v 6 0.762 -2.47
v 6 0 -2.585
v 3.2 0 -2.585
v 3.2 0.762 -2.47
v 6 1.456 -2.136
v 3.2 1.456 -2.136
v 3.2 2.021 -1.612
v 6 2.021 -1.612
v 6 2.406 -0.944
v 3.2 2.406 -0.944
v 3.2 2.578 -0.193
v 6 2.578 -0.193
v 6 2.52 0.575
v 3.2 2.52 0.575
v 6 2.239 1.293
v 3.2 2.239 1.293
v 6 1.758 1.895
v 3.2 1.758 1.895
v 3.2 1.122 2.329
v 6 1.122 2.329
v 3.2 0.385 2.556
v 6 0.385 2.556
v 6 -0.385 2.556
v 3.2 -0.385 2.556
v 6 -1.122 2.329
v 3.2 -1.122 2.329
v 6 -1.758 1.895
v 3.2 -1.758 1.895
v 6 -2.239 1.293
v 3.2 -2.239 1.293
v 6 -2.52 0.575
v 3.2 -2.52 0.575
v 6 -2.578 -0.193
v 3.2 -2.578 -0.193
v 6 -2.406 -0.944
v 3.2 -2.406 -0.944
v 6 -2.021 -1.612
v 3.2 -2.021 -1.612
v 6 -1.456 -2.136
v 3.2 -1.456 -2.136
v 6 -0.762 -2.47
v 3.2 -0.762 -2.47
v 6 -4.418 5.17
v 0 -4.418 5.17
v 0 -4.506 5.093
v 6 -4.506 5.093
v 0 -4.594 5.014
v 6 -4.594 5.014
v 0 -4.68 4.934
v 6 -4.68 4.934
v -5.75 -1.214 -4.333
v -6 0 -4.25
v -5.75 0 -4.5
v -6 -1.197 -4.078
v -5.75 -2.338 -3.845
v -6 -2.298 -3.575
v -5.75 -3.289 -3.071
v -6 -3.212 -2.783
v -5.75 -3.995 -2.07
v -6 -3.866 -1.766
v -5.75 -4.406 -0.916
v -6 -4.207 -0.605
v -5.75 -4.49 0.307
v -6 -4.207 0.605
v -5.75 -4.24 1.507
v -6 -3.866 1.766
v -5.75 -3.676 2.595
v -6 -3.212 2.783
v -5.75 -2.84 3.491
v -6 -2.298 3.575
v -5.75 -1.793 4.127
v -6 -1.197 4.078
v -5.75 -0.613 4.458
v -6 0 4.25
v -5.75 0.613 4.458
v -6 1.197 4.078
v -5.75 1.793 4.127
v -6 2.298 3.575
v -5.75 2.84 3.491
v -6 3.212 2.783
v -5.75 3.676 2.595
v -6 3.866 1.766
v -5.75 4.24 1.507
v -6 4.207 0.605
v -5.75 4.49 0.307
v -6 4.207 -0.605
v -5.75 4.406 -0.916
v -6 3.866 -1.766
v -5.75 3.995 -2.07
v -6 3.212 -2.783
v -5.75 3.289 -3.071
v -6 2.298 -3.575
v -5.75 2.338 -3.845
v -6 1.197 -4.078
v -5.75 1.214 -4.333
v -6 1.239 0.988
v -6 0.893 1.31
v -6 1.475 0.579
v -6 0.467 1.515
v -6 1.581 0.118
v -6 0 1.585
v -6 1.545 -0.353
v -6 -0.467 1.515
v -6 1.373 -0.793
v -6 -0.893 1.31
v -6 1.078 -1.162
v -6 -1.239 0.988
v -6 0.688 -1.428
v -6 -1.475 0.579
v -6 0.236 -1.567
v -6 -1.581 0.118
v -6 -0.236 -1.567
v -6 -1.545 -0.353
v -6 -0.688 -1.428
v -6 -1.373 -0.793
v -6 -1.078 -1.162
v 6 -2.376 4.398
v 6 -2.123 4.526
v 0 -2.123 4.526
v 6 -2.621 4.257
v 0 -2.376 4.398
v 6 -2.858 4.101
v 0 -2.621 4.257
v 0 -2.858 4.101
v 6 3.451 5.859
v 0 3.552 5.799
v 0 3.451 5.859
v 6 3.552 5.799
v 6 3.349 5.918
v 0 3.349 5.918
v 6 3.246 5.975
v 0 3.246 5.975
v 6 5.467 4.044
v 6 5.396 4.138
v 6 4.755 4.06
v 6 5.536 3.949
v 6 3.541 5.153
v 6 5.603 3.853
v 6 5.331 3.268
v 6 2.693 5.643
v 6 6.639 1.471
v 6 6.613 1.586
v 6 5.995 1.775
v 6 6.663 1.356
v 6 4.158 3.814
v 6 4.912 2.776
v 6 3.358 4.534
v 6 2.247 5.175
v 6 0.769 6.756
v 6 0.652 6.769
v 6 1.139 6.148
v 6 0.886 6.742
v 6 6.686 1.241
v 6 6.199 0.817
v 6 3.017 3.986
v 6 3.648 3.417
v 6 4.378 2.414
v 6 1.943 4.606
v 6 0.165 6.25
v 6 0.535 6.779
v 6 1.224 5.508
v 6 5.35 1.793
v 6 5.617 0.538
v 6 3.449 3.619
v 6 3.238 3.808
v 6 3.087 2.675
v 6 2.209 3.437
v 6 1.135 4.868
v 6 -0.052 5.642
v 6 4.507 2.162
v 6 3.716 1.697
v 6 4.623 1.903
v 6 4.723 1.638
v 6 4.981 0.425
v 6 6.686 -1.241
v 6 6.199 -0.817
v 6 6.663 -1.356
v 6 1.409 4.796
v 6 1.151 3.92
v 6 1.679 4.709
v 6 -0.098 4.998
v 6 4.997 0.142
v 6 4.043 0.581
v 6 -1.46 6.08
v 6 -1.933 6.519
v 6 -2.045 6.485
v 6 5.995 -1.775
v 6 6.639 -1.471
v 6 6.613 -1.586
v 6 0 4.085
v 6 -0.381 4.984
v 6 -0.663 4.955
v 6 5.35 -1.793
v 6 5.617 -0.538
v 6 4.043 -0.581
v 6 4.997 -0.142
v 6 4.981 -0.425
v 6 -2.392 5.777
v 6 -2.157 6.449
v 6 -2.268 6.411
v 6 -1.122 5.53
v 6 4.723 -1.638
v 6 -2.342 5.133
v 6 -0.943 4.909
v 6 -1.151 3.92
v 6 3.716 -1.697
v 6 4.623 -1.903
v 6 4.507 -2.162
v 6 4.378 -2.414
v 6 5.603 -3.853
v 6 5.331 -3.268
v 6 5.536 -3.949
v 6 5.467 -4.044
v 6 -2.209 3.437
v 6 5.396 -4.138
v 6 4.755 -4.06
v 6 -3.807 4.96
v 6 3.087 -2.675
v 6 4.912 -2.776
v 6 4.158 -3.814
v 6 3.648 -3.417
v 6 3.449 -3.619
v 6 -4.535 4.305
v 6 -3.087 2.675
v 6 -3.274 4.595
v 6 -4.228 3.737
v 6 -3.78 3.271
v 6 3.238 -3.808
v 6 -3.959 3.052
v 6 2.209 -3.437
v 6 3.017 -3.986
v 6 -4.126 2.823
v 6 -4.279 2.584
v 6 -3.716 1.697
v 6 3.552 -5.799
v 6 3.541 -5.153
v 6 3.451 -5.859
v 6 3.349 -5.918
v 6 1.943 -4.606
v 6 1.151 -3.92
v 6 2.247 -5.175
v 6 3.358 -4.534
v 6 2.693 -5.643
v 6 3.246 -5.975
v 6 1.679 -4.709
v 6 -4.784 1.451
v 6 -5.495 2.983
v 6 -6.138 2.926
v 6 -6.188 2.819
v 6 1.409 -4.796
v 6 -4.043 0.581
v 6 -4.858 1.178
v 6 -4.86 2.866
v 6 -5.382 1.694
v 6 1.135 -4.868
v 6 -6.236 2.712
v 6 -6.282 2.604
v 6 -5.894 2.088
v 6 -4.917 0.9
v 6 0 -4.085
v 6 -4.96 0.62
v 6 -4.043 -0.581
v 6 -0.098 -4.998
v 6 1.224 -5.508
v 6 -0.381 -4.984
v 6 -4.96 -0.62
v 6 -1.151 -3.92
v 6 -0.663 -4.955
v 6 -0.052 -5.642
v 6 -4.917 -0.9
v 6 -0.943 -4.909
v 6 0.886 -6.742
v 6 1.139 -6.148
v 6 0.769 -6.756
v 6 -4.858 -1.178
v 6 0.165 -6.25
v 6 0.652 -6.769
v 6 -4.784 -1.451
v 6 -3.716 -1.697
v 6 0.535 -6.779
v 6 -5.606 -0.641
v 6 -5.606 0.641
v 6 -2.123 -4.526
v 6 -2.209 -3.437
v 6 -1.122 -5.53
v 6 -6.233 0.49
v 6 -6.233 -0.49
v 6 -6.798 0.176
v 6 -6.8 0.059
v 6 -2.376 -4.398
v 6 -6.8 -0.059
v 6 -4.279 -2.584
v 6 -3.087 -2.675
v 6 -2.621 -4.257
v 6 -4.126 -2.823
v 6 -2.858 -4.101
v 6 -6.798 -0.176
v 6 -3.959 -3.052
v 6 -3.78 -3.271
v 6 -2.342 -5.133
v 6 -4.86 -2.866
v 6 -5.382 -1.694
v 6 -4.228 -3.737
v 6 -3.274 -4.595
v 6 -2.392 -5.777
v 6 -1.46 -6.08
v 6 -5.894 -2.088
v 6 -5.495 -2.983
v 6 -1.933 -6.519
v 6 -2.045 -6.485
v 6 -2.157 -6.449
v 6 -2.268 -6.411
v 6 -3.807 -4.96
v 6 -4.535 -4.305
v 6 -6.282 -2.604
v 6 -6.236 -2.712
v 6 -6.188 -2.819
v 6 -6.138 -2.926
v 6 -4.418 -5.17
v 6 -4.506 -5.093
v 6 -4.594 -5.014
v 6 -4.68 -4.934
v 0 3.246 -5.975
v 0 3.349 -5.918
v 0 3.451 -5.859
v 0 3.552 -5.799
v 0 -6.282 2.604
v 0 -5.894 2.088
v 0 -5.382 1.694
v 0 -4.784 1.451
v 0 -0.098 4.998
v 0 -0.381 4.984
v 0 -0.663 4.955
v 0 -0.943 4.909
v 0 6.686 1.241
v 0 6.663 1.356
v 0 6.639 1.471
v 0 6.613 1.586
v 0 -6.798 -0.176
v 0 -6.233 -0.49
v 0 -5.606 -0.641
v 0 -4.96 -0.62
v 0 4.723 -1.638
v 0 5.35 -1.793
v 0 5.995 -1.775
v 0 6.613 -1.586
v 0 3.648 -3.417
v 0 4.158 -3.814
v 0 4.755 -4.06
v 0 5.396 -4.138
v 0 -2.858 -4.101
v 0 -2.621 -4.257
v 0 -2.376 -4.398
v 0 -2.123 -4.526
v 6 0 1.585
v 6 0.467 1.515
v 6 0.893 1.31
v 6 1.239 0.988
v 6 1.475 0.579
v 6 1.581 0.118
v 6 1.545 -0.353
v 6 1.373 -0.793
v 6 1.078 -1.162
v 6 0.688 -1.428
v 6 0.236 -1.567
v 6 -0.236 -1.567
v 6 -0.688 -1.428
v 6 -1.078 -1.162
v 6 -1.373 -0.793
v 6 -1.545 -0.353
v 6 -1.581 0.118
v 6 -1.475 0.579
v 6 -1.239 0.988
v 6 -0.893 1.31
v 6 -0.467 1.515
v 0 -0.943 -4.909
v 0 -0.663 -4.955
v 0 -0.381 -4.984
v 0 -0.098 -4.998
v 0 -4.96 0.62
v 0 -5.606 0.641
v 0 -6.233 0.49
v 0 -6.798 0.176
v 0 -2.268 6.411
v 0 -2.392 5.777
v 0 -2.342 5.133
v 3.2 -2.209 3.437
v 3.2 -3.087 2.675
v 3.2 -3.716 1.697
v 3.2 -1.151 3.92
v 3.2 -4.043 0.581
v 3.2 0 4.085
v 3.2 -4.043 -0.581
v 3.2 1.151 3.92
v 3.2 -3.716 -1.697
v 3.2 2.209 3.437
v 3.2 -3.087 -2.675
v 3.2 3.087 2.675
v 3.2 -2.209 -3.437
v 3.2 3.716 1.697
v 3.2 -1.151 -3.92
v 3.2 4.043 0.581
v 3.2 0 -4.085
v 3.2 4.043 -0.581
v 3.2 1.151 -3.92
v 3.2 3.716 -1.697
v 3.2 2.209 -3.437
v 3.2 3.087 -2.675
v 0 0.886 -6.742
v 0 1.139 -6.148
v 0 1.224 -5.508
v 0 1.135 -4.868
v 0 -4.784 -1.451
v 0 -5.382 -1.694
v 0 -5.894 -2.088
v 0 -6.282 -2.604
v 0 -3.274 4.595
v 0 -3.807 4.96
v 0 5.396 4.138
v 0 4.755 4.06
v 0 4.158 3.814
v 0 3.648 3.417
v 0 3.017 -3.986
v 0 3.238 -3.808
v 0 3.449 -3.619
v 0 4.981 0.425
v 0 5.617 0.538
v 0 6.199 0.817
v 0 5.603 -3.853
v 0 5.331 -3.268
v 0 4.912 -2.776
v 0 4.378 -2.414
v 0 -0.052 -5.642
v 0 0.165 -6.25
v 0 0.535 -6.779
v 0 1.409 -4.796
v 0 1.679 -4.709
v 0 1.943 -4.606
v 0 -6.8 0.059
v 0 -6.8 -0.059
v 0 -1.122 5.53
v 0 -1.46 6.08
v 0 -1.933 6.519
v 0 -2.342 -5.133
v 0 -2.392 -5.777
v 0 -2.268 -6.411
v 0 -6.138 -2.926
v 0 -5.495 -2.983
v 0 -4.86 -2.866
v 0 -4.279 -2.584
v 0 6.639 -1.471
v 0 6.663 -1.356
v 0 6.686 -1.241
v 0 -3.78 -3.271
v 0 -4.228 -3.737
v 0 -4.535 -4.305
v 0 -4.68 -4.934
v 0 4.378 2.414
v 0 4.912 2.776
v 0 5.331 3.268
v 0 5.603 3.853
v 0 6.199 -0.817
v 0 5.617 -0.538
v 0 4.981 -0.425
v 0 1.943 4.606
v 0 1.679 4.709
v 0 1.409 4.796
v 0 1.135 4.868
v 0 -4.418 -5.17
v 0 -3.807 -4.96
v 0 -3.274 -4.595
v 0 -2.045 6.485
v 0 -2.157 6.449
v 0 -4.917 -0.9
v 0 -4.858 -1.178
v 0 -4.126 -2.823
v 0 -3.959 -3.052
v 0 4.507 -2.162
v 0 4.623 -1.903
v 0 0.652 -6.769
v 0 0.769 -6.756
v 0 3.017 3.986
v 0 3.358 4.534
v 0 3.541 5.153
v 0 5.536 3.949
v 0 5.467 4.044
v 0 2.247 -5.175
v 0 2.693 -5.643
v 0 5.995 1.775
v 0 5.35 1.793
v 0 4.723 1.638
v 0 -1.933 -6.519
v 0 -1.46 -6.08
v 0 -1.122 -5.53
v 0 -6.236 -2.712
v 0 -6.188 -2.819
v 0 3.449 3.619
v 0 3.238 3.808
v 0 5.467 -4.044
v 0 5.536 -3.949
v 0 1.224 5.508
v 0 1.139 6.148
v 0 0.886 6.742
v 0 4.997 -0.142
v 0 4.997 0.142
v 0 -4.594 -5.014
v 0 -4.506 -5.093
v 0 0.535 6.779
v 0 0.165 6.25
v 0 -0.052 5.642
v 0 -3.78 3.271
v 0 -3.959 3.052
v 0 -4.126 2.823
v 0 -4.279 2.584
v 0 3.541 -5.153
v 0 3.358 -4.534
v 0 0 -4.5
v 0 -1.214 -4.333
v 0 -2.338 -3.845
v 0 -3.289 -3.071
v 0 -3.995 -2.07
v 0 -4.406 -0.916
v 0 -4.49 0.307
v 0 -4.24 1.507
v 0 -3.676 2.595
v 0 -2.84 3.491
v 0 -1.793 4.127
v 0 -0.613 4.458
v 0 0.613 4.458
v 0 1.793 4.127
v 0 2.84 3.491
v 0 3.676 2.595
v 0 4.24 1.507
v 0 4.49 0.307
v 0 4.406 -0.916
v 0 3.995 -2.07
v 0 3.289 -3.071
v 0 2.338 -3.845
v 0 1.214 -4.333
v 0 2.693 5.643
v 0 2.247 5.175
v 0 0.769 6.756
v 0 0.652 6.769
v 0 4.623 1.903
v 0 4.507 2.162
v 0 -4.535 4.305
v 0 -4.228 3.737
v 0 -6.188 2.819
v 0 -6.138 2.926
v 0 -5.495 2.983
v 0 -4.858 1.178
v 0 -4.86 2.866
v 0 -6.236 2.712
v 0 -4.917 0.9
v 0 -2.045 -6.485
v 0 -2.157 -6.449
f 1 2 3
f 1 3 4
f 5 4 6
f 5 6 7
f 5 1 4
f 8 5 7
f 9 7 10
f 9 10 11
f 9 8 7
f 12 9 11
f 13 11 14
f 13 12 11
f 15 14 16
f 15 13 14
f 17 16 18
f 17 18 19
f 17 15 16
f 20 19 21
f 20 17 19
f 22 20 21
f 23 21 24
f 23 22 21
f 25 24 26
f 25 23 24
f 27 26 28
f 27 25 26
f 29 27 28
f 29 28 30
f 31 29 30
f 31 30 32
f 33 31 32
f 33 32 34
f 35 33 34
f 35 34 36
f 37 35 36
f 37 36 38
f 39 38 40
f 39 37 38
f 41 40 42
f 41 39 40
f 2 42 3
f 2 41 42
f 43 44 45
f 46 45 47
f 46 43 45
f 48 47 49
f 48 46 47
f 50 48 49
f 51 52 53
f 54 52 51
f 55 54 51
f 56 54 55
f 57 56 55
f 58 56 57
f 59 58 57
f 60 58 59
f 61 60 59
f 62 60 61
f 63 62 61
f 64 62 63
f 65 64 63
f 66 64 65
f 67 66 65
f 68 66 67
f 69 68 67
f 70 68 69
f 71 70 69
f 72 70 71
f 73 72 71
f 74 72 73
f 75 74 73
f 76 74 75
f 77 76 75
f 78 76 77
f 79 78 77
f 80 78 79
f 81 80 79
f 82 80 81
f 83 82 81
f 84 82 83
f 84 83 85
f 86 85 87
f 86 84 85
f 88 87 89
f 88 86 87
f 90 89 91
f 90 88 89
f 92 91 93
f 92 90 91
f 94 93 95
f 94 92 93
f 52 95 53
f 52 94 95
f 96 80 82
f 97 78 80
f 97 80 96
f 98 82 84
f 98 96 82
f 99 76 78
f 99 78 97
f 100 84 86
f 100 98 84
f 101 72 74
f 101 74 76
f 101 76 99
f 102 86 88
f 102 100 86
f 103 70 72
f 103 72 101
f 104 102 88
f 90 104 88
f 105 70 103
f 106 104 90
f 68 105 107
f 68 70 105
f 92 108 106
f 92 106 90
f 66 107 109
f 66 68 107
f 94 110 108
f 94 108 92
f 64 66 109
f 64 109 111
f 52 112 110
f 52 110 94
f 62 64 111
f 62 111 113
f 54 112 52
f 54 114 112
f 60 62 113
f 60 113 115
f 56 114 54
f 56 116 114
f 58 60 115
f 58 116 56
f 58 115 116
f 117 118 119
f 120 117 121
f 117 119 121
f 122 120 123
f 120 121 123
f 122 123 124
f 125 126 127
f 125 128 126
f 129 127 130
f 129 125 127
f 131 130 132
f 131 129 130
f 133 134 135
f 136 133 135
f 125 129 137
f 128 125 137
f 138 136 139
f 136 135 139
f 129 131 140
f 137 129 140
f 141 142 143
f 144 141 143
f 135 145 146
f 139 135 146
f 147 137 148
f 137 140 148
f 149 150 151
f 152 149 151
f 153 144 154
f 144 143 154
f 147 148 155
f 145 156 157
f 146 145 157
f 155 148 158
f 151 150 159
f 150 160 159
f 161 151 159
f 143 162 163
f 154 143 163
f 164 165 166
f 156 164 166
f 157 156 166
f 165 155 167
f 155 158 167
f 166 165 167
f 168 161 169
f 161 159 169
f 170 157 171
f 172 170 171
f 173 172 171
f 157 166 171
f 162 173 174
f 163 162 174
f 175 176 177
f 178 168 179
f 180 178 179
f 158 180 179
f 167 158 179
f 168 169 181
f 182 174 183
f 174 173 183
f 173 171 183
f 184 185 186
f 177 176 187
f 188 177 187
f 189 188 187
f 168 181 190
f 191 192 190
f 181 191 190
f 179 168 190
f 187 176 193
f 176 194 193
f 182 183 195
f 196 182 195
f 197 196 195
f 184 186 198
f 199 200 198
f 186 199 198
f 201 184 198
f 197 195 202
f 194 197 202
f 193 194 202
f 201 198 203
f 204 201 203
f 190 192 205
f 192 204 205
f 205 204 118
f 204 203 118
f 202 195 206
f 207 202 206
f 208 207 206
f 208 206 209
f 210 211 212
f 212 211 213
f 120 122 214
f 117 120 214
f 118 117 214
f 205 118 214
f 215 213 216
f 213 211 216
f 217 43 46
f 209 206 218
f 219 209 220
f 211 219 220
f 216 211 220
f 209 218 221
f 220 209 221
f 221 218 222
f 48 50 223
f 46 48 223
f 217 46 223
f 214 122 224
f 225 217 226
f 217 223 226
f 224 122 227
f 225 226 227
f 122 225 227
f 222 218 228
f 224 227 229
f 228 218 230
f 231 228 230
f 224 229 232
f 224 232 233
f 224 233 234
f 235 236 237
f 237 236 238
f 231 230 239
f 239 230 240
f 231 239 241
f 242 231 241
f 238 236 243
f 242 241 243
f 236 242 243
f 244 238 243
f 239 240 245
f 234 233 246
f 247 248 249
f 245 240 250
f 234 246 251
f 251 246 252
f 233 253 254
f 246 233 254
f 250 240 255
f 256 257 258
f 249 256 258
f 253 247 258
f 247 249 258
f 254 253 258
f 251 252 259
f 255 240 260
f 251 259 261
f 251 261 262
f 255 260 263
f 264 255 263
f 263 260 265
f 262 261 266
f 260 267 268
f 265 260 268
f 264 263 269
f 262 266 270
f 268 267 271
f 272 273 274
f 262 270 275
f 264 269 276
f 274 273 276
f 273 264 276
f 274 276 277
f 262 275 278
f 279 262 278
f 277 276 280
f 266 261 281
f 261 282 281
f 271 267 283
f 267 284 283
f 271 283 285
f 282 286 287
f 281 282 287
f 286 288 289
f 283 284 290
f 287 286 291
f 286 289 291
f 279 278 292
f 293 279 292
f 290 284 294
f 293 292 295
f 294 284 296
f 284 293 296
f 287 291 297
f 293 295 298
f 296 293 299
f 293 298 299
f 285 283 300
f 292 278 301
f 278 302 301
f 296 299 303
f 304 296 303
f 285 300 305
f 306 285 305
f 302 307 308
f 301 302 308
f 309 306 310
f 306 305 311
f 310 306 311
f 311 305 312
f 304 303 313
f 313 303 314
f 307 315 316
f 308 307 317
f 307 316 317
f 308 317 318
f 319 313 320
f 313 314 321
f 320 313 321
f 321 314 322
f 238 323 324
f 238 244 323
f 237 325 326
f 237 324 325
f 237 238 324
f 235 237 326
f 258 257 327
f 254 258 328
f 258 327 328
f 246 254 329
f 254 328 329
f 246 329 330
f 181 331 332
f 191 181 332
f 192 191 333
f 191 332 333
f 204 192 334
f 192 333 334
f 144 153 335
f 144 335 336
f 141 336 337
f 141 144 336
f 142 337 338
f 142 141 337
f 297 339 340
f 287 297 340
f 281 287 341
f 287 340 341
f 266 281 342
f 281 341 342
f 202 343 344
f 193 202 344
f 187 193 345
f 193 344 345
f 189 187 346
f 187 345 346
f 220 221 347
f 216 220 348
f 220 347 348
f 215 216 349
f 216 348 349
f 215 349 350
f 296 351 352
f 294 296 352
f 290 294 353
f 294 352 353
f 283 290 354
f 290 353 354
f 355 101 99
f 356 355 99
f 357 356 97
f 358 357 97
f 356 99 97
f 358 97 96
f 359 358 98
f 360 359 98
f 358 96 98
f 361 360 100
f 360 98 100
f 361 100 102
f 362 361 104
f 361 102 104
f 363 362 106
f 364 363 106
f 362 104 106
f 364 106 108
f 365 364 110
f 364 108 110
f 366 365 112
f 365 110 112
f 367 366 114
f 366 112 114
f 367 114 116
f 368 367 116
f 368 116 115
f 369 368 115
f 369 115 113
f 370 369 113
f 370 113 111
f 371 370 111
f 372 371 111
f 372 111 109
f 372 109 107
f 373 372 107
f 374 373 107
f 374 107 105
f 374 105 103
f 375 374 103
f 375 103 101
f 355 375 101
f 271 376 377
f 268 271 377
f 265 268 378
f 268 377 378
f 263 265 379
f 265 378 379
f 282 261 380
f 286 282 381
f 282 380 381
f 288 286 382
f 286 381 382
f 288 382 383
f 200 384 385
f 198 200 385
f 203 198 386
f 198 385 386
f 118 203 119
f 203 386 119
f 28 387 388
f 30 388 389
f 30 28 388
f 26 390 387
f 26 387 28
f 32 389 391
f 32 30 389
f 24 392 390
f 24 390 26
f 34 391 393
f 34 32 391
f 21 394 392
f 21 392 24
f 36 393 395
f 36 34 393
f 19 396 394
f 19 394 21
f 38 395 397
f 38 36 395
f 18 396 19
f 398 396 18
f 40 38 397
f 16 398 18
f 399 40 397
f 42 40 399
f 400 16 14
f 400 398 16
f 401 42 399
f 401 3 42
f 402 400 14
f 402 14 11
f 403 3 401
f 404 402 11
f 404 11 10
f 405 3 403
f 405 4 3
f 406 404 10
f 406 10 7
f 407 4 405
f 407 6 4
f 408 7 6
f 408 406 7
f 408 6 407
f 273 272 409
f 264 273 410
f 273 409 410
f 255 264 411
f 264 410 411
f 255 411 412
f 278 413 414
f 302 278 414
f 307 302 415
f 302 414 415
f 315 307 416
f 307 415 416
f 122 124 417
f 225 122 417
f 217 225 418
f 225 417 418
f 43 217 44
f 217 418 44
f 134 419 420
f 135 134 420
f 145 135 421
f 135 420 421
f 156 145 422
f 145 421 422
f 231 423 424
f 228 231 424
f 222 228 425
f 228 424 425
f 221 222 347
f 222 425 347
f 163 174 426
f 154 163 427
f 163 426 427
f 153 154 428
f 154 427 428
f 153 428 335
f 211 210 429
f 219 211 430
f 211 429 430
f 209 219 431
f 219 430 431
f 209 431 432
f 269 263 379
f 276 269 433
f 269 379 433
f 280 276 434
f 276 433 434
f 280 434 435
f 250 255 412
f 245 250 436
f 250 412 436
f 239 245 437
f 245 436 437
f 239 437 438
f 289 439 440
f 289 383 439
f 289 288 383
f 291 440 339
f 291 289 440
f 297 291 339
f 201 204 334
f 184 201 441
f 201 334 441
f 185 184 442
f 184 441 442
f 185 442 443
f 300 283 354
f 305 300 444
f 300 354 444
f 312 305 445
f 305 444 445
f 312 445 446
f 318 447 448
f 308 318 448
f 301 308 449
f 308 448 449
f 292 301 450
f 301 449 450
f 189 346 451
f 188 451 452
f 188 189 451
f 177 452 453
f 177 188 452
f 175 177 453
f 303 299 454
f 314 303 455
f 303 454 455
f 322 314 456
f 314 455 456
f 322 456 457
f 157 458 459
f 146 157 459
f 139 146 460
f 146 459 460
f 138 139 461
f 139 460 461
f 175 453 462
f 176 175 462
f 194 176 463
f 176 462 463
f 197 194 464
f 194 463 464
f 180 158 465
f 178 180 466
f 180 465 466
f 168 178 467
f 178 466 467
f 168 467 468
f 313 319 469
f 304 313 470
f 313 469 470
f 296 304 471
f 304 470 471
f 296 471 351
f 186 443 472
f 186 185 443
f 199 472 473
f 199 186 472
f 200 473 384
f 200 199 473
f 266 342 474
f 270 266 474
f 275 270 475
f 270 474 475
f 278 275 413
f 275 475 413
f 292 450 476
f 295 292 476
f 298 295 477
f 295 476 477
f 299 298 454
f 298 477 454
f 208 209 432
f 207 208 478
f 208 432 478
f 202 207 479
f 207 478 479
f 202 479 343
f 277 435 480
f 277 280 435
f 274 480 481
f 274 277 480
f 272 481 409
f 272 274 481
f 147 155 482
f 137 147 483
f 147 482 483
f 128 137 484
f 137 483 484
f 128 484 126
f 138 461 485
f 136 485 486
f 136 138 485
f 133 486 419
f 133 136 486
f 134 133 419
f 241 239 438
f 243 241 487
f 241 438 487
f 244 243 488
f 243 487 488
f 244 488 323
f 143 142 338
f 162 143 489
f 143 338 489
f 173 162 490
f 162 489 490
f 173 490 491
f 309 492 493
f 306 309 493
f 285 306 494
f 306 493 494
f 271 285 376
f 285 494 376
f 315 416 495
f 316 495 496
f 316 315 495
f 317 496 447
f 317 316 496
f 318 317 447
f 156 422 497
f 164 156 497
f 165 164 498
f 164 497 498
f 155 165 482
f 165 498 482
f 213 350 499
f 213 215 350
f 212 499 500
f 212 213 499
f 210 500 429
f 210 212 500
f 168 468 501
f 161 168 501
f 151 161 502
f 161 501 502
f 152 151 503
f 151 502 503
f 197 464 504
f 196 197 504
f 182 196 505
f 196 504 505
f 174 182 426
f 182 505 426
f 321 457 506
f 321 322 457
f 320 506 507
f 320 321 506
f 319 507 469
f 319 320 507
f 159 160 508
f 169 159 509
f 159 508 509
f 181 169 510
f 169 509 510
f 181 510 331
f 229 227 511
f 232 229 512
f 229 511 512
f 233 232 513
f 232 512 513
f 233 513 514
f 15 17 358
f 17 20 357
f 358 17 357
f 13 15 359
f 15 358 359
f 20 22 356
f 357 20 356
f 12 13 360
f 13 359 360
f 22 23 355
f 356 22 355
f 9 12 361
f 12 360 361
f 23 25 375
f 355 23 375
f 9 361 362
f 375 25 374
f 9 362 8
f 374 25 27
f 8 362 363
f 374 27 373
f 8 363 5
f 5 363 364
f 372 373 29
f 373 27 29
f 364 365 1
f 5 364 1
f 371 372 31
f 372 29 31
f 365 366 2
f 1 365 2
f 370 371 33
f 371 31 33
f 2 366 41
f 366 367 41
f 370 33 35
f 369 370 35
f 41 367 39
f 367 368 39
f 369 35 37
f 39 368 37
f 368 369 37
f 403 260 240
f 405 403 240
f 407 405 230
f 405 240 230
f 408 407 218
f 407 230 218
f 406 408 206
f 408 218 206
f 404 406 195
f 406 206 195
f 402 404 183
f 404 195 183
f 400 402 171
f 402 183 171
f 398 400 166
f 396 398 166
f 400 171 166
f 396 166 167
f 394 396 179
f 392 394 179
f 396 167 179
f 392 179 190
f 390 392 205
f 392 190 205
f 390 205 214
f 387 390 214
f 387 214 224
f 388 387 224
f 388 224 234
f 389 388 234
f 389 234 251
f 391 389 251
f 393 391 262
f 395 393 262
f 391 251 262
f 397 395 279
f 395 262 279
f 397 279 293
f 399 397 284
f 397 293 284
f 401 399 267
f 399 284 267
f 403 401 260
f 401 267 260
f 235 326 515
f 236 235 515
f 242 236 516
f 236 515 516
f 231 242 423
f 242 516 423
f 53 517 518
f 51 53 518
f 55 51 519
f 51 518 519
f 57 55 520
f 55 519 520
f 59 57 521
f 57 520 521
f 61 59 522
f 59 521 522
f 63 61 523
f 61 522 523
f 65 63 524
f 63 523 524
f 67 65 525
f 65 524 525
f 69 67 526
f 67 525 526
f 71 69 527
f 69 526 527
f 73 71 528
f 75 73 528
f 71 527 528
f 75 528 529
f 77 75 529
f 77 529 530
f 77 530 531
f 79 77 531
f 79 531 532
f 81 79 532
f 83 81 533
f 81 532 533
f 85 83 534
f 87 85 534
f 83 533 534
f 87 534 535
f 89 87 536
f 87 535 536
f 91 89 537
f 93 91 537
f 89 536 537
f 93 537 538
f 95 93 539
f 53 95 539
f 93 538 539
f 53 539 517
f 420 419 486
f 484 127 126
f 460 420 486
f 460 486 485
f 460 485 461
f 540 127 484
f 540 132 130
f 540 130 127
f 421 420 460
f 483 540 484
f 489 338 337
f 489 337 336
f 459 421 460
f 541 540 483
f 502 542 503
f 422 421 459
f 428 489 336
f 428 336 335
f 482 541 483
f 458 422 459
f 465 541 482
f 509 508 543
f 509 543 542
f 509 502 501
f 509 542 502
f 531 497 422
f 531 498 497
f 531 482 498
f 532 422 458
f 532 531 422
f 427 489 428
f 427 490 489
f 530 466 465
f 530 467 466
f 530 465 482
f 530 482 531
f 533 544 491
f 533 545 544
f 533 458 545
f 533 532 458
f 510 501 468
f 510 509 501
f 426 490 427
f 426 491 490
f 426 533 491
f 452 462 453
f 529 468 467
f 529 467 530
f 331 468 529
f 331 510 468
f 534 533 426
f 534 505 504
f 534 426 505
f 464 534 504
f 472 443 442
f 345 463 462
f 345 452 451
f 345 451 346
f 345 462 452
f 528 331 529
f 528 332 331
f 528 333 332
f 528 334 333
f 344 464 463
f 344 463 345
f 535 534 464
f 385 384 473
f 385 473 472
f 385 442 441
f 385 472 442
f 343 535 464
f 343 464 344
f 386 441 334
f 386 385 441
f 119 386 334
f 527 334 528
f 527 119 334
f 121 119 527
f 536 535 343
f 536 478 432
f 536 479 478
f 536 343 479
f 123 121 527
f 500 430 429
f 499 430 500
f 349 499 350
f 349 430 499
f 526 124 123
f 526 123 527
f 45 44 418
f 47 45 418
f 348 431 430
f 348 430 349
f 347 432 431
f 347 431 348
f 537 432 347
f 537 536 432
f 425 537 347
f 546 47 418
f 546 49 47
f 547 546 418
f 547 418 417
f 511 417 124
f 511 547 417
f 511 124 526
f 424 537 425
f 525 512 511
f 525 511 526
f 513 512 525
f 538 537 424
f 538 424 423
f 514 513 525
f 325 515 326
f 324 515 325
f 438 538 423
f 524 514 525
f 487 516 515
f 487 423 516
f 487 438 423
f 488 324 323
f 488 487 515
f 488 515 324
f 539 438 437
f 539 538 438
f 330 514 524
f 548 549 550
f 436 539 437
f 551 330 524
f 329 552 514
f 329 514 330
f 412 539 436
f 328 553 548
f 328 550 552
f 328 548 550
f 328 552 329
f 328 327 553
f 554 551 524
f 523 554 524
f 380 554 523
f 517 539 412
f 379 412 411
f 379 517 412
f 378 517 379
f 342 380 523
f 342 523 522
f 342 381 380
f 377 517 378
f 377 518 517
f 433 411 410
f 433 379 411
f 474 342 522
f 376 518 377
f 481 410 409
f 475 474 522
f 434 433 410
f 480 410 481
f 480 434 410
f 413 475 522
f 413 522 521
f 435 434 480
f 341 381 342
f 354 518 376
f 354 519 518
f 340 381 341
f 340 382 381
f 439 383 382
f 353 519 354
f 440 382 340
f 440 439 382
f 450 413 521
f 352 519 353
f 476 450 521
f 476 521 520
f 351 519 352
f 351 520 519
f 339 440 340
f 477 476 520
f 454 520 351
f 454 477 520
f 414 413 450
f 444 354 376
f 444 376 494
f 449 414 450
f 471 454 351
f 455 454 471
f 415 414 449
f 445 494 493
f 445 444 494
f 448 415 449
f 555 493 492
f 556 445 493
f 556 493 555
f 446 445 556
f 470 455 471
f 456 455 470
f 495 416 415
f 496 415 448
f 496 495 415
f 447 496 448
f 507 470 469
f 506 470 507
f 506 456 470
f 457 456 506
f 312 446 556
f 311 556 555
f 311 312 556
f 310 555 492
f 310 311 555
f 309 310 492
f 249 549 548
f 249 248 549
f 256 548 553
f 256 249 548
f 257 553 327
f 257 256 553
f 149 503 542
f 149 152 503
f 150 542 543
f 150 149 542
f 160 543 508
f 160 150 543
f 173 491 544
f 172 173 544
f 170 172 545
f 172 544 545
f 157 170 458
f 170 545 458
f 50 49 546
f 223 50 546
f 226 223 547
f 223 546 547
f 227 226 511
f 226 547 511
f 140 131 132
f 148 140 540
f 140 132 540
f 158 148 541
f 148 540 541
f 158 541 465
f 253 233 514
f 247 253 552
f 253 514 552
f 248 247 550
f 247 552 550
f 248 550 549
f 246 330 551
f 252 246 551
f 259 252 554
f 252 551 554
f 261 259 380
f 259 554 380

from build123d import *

# Parameters (mm, degrees)
BASPROSKE_W             = 6
BASPROSKE_H             = 6.8
TOOTHCUT_DEPTH          = 12.334901852
TEETHCUTS_COUNT         = 15
TEETHCUTS_ANGLE         = 336
BORSKE_R                = 0.4
BORE_DEPTH              = 50.0000508
ESQUISSE1_R             = 4.5
BOSS_EXTRU_1_DEPTH      = 6
ENL_V_MAT_EXTRU_1_REACH = 17.369
ESQUISSE2_R             = 1.585
ESQUISSE3_R             = 4.085
ESQUISSE3_R_2           = 2.585
ENL_V_MAT_EXTRU_2_DEPTH = 2.8
CHANFREIN1_SIZE         = 0.25


with BuildPart() as part:
    # BasProSke → Base-Revolve (revolve)
    with BuildSketch(Plane(origin=(0, 0, 0), x_dir=(1, 0, 0), z_dir=(0, 1, 0)), mode=Mode.PRIVATE) as base_revolve_sk:
        with Locations((3, 3.4)):
            Rectangle(BASPROSKE_W, BASPROSKE_H)
    revolve(base_revolve_sk.sketch.rotate(Axis((-10, 0, 0), (1, 0, 0)), 180), axis=Axis((-10, 0, 0), (1, 0, 0)))

    # TooCutSke → ToothCut (cut, through all)
    with BuildSketch(Plane(origin=(0, 0, 0), x_dir=(0, 0, -1), z_dir=(1, 0, 0))):
        with BuildLine():
            ThreePointArc((0.424668738, 4.980929377), (0, 4.999), (-0.424668738, 4.980929377))
            ThreePointArc((-0.424668738, 4.980929377), (-0.664927989, 5.931738726), (-1.265455885, 6.70706393))
            ThreePointArc((-1.265455885, 6.70706393), (0, 6.8254), (1.265455885, 6.70706393))
            ThreePointArc((1.265455885, 6.70706393), (0.664927989, 5.931738726), (0.424668738, 4.980929377))
        make_face()
    toothcut = extrude(amount=TOOTHCUT_DEPTH, mode=Mode.SUBTRACT)

    # TeethCuts: ToothCut ×15 about axis
    teethcuts_axis = Axis((-10, 0, 0), (1, 0, 0))
    for i in range(1, TEETHCUTS_COUNT):
        add(toothcut.rotate(teethcuts_axis, i * TEETHCUTS_ANGLE / (TEETHCUTS_COUNT - 1)), mode=Mode.SUBTRACT)

    # BorSke → Bore (cut, symmetric)
    with BuildSketch(Plane(origin=(0, 0, 0), x_dir=(0, 0, -1), z_dir=(1, 0, 0))):
        with Locations(Location((0, 0, 0), (0, 0, 180))):
            Circle(BORSKE_R)
    extrude(amount=BORE_DEPTH, both=True, mode=Mode.SUBTRACT)

    # Esquisse1 → Boss.-Extru.1 (add)
    with BuildSketch(Plane.ZY):
        with Locations(Location((0, 0, 0), (0, 0, 180))):
            Circle(ESQUISSE1_R)
    extrude(amount=BOSS_EXTRU_1_DEPTH)

    # Esquisse2 → Enlèv. mat.-Extru.1 (cut, up to next)
    with BuildSketch(Plane.ZY.offset(6), mode=Mode.PRIVATE) as enl_v_mat_extru_1_sk1:
        Circle(ESQUISSE2_R)
    enl_v_mat_extru_1_tool1 = extrude(enl_v_mat_extru_1_sk1.sketch, amount=-ENL_V_MAT_EXTRU_1_REACH, mode=Mode.PRIVATE) & part.part
    add(enl_v_mat_extru_1_tool1.solids().sort_by_distance((-6, 0, 0))[0], mode=Mode.SUBTRACT)

    # Esquisse3 → Enlèv. mat.-Extru.2 (cut)
    with BuildSketch(Plane(origin=(6, 0, 0), x_dir=(0, 0, -1), z_dir=(1, 0, 0))):
        Circle(ESQUISSE3_R)
        Circle(ESQUISSE3_R_2, mode=Mode.SUBTRACT)
    extrude(amount=-ENL_V_MAT_EXTRU_2_DEPTH, mode=Mode.SUBTRACT)

    # Chanfrein1
    chanfrein1_edges = [part.edges().sort_by_distance(p)[0] for p in [
        (-6, 0, 4.5),
    ]]
    chamfer(chanfrein1_edges, length=CHANFREIN1_SIZE)


solid = part.part
